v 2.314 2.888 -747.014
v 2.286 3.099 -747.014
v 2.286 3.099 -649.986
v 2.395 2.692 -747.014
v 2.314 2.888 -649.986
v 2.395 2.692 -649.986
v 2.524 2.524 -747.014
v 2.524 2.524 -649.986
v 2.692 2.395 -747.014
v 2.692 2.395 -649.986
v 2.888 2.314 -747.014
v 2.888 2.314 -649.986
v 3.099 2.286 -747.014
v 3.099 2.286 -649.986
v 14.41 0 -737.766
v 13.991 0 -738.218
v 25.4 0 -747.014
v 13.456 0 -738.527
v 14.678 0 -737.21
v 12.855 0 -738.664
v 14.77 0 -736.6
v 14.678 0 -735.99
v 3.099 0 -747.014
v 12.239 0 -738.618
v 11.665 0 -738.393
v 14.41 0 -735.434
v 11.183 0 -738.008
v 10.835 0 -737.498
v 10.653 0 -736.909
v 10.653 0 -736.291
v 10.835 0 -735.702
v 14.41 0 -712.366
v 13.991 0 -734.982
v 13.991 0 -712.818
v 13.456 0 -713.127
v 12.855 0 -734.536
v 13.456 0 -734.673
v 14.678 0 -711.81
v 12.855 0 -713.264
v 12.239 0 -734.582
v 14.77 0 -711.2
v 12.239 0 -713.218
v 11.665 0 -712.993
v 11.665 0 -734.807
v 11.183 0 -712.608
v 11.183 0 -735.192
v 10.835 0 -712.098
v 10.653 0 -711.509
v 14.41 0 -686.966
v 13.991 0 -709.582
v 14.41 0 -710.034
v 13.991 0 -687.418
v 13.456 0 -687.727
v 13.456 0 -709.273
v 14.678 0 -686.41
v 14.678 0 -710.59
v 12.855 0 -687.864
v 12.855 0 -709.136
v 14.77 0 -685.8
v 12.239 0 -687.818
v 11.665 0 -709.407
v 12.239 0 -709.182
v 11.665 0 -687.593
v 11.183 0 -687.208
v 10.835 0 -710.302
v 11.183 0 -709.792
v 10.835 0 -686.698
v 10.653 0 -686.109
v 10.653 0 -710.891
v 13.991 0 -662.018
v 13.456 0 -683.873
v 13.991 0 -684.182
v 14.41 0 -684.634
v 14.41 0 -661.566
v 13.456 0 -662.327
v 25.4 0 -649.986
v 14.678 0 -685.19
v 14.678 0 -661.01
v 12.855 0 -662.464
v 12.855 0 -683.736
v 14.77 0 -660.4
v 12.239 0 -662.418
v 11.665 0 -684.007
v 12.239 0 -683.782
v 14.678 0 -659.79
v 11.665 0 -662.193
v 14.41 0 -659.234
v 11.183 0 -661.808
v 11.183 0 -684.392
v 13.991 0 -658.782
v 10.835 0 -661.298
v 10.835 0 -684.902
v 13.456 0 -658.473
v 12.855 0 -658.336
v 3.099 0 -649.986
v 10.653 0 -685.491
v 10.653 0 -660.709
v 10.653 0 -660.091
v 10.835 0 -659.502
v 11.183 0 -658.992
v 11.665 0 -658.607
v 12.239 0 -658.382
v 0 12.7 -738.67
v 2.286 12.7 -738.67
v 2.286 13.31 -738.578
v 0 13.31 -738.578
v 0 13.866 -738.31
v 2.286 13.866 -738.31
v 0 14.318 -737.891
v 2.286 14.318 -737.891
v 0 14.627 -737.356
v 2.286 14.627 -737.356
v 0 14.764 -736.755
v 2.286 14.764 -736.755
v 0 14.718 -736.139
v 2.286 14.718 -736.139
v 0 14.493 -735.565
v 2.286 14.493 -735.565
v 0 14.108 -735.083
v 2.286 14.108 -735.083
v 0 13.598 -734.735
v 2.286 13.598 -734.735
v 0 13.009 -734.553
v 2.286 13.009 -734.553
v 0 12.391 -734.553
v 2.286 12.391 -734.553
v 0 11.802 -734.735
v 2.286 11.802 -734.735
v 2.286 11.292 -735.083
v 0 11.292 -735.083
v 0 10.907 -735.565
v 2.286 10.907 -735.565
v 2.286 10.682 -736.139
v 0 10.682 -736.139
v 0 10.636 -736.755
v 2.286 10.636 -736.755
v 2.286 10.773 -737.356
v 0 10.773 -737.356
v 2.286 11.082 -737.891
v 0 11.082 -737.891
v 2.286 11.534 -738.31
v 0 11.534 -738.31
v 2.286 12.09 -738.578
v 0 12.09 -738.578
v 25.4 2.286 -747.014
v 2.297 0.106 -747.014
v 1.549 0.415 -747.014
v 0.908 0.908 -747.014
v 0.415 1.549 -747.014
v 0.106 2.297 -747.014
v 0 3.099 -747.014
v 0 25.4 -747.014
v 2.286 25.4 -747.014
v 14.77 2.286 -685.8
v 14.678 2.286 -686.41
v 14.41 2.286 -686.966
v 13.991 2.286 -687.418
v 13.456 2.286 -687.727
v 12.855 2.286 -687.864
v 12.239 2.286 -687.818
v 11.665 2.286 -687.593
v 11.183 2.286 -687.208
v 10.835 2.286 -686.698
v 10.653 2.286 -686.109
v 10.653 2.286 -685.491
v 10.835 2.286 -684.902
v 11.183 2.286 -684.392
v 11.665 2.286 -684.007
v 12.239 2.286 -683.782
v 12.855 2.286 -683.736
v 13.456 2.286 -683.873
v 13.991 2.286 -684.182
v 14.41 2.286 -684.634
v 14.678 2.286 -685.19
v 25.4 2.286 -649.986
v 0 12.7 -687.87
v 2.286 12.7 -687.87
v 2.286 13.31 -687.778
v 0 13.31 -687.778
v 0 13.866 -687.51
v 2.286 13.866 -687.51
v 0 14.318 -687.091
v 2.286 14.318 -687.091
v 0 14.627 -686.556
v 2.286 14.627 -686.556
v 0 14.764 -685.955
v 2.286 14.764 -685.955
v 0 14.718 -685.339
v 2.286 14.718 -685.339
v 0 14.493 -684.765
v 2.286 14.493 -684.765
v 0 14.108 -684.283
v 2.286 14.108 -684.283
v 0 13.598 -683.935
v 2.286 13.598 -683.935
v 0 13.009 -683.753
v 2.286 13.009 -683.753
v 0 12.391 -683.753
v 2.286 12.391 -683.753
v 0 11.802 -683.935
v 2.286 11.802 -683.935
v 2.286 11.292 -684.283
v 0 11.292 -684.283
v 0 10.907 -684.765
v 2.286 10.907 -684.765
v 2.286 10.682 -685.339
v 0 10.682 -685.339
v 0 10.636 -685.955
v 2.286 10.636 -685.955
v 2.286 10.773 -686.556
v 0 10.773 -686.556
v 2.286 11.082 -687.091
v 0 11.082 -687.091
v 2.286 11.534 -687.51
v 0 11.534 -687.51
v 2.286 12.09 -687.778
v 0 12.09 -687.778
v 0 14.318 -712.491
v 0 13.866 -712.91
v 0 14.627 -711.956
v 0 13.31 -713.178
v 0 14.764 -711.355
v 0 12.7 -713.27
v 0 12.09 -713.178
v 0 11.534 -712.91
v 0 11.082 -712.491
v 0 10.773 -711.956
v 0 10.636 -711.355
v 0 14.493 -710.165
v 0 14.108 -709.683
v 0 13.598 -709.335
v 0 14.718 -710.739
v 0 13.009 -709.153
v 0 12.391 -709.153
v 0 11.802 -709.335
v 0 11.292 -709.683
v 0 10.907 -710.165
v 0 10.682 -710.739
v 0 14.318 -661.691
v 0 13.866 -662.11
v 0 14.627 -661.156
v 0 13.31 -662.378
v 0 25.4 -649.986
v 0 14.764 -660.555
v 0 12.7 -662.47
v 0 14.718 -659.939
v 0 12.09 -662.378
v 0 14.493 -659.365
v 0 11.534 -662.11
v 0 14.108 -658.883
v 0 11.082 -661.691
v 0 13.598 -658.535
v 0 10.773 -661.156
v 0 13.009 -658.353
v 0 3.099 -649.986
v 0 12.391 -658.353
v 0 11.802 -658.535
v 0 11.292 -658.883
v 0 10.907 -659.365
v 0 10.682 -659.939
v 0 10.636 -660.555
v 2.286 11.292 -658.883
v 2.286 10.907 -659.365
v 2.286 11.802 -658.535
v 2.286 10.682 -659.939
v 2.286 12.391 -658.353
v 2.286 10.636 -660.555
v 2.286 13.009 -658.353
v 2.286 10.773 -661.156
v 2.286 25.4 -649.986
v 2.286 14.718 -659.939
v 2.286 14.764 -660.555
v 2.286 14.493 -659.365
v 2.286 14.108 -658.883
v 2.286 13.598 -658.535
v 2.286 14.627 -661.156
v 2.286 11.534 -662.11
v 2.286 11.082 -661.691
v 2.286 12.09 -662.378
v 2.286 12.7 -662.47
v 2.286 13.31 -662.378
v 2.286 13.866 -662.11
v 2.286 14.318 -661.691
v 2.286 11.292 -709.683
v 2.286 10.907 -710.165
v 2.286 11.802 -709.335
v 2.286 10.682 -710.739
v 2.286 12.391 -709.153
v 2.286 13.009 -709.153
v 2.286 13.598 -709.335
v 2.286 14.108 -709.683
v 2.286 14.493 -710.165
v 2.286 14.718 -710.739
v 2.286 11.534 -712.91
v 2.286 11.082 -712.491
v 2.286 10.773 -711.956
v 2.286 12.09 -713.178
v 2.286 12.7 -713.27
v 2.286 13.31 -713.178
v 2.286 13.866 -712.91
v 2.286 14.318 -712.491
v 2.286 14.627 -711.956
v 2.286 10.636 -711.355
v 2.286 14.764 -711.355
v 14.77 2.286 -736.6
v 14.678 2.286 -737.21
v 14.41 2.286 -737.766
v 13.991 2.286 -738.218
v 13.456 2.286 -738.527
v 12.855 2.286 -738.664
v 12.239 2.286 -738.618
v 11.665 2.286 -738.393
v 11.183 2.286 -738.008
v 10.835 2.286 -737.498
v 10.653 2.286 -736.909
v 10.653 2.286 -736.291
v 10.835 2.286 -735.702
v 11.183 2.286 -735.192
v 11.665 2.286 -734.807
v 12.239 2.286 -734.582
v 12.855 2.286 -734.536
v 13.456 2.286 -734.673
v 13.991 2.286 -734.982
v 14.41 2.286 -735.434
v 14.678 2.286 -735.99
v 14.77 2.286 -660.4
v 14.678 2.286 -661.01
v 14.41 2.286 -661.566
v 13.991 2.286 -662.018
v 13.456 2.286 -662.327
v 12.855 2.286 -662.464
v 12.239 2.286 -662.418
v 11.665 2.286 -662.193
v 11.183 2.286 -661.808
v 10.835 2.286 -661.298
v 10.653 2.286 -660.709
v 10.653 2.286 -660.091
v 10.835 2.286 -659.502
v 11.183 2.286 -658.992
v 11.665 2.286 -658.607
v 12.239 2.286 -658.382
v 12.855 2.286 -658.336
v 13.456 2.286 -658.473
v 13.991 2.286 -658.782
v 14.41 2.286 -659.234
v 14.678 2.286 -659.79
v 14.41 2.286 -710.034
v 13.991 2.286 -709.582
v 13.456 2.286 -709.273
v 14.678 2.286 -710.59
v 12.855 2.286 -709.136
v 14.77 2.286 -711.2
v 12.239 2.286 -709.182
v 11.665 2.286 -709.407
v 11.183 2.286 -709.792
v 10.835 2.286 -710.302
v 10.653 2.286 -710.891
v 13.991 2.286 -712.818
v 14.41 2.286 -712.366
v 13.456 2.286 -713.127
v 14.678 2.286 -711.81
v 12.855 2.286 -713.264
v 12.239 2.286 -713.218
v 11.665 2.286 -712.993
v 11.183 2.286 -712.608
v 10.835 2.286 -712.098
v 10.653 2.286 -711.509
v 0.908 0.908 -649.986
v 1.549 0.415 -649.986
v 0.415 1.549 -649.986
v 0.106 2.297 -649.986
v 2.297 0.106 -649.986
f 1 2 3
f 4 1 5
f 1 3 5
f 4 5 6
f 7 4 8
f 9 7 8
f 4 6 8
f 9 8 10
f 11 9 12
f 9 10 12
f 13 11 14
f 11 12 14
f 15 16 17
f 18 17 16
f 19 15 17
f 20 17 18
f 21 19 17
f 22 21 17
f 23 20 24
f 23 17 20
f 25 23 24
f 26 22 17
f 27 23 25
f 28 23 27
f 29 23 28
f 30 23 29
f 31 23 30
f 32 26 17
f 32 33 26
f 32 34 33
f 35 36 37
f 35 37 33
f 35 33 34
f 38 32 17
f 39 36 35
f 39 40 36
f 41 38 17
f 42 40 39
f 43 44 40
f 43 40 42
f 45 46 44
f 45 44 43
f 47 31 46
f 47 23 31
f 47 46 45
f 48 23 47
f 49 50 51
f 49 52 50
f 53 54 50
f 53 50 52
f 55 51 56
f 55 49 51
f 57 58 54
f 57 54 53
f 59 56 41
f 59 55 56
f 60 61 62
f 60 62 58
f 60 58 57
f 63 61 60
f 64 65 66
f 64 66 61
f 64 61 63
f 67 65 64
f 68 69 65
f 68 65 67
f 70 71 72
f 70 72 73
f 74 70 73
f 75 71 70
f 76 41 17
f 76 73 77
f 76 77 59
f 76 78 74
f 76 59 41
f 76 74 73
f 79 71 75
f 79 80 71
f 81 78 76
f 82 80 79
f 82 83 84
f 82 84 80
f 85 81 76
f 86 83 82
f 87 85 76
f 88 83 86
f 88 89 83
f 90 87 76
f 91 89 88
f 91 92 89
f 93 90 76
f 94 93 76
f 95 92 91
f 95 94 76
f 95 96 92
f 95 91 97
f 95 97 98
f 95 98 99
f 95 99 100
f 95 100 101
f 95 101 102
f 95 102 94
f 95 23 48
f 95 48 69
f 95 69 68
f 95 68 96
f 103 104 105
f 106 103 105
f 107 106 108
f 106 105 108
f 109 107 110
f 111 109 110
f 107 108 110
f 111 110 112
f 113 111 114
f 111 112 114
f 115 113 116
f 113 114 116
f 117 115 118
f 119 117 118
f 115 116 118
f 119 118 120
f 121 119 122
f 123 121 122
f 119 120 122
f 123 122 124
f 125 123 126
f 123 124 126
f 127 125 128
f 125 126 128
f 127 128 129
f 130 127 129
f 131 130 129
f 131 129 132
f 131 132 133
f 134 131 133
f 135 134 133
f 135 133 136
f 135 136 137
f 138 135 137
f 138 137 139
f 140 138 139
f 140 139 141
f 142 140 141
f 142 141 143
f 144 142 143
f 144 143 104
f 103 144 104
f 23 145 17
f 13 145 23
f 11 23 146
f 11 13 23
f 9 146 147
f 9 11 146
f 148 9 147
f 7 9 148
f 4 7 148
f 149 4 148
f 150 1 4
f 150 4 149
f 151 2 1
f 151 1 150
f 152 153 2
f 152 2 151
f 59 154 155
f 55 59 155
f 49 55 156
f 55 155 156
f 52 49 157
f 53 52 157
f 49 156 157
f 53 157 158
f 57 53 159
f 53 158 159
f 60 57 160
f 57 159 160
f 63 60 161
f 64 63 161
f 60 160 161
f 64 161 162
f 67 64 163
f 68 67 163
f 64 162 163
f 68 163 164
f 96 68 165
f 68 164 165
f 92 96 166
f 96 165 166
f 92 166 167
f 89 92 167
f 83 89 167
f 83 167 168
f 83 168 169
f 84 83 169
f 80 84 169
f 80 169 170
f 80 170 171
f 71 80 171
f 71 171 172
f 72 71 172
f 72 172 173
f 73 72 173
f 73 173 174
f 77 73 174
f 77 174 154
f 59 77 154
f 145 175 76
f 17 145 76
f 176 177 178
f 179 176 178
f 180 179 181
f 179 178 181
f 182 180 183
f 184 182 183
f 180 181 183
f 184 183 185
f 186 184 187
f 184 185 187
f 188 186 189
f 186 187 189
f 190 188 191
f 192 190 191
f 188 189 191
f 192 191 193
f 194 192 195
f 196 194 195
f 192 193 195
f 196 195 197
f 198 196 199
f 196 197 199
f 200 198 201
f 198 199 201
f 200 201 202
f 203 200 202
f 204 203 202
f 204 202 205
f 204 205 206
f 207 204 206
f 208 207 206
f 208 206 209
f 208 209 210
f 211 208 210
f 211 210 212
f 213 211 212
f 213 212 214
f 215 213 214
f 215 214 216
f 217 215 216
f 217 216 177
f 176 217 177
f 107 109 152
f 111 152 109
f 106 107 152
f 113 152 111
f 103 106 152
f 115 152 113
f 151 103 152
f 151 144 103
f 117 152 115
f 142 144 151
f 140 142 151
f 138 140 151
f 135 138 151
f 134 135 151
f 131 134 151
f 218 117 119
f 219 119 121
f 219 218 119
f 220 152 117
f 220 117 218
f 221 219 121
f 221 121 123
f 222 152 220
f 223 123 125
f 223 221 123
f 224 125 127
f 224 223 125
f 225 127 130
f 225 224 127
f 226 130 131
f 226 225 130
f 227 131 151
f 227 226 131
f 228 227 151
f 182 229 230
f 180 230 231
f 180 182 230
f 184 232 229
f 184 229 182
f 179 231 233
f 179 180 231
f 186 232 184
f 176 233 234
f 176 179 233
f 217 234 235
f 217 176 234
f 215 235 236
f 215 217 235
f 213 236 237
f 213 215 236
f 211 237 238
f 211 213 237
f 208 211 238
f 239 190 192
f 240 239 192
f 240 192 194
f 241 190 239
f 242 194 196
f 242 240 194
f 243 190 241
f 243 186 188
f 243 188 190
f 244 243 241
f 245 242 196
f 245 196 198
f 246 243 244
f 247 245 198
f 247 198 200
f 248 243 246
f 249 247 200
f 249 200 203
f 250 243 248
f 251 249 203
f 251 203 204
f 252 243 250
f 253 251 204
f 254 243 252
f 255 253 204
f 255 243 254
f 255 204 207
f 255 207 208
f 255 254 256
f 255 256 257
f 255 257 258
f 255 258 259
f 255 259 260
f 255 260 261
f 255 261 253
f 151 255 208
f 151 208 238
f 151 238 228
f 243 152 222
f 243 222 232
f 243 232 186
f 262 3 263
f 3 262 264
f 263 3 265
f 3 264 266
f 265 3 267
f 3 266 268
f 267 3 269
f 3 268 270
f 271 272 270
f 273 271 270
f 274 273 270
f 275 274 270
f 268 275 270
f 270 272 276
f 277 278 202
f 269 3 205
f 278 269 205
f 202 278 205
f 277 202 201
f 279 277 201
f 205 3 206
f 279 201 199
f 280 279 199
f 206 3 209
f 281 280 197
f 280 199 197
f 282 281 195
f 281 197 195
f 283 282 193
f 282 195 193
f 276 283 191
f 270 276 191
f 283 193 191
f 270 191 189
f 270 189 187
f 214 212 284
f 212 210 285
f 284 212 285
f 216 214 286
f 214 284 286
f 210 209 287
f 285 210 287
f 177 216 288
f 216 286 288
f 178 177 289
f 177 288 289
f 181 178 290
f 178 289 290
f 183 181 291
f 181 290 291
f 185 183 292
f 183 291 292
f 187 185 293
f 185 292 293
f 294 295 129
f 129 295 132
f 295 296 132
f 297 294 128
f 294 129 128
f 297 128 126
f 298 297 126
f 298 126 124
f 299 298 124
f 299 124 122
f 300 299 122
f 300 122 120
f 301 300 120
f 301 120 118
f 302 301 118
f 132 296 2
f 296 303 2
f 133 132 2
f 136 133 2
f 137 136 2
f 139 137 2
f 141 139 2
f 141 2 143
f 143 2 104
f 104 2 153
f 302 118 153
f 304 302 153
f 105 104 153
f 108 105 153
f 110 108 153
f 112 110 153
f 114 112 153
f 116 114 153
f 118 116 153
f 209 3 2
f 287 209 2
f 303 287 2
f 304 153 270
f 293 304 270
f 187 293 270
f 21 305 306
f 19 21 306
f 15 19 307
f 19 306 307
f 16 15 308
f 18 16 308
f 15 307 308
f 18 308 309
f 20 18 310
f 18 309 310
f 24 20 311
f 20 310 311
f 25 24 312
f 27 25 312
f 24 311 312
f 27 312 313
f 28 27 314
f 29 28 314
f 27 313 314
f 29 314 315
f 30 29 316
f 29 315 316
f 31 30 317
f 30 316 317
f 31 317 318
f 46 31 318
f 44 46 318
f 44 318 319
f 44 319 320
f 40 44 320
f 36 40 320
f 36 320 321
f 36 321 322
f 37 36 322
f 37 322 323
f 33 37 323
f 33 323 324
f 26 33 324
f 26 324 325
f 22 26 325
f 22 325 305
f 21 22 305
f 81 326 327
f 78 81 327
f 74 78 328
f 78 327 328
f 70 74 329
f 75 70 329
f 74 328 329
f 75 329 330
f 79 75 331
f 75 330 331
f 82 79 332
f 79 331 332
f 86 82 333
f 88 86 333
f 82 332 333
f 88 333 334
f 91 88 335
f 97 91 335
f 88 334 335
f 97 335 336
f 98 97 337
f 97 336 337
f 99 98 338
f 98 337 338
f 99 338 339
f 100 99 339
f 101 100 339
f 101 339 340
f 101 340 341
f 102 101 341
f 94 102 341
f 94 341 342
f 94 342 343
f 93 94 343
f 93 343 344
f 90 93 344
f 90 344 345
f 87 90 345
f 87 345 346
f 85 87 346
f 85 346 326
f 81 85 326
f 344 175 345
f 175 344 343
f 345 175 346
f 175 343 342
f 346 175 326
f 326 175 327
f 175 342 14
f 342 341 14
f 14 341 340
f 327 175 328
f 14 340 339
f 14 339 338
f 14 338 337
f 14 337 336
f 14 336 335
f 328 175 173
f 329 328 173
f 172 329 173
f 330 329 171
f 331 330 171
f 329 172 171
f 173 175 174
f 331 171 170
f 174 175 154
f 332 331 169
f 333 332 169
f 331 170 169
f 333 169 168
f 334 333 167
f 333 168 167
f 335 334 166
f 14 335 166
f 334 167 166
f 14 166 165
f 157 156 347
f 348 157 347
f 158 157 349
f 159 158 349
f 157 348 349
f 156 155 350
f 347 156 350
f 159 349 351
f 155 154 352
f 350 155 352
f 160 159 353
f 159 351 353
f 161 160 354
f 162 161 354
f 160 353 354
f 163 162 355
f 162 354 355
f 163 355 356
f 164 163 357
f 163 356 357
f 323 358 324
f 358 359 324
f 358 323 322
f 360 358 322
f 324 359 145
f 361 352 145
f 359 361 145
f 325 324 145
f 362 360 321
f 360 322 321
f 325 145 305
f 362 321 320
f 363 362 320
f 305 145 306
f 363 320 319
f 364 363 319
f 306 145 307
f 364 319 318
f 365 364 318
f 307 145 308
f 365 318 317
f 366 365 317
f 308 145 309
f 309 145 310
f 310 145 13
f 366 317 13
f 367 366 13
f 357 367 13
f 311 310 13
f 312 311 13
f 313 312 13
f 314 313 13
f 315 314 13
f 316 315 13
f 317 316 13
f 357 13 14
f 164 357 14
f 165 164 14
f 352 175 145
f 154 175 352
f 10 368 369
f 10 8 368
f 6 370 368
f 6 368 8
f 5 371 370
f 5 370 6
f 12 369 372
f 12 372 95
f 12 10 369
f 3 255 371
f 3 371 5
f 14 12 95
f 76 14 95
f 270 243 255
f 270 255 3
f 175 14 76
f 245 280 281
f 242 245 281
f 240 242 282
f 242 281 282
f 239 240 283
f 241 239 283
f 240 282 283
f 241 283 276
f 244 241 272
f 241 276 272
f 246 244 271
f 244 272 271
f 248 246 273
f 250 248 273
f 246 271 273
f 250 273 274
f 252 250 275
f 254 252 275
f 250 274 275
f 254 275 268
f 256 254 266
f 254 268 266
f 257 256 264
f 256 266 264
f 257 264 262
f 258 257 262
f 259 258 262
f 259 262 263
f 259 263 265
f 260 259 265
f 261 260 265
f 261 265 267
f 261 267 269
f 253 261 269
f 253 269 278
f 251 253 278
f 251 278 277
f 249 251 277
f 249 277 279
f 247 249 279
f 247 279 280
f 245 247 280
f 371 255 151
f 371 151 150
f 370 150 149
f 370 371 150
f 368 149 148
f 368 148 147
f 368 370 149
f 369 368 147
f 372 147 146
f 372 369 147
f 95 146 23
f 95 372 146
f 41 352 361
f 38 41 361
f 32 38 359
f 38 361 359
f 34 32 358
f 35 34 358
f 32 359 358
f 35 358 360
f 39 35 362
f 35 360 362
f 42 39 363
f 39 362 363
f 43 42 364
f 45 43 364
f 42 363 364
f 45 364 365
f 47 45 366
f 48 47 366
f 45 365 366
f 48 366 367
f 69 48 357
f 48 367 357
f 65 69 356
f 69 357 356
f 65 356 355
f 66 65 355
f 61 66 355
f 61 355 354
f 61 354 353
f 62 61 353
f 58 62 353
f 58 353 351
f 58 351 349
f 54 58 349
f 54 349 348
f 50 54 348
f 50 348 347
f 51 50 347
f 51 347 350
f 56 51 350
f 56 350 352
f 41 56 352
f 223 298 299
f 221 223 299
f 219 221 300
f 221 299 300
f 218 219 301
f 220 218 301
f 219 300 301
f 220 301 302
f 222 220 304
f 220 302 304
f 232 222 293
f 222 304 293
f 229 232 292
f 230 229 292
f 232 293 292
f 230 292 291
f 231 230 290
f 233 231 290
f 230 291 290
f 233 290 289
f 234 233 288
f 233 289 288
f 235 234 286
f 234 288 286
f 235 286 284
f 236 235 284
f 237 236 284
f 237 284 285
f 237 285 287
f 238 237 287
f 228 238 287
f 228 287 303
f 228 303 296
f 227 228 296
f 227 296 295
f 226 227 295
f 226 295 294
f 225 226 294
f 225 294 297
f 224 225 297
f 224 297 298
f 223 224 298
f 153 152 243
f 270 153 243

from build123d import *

# Parameters (mm, degrees)
SKETCH1_W                  = 25.4
SKETCH1_H                  = 1498.6
BOSS_EXTRUDE1_DEPTH        = 25.4
SKETCH2_W                  = 23.114
SKETCH2_H                  = 23.114
CUT_EXTRUDE1_DEPTH         = 1499.6
M3_5_CLEARANCE_HOLE1_D     = 4.1402
M3_5_CLEARANCE_HOLE1_DEPTH = 25.4
M3_5_CLEARANCE_HOLE2_D     = 4.1402
M3_5_CLEARANCE_HOLE2_DEPTH = 25.4
CHAMFER1_SIZE              = 2.159
FILLET1_R                  = 0.8128
FILLET2_R                  = 3.0988
SKETCH8_W                  = 95.882963774
SKETCH8_H                  = 79.338329604
CUT_EXTRUDE3_DEPTH         = 1397
SKETCH9_W                  = 55.647897921
SKETCH9_H                  = 59.659370493
CUT_EXTRUDE4_DEPTH         = 2.286
SKETCH10_W                 = 60.180202688
SKETCH10_H                 = 53.53268885
CUT_EXTRUDE5_DEPTH         = 2.286


with BuildPart() as part:
    # Sketch1 → Boss-Extrude1 (new body)
    with BuildSketch(Plane(origin=(0, 0, 0), x_dir=(0, -1, 0), z_dir=(-1, 0, 0))):
        with Locations((-12.7, 0)):
            Rectangle(SKETCH1_W, SKETCH1_H)
    extrude(amount=-BOSS_EXTRUDE1_DEPTH)

    # Sketch2 → Cut-Extrude1 (cut, through all)
    with BuildSketch(Plane(origin=(0, 0, -749.3), x_dir=(-1, 0, 0), z_dir=(0, 0, -1))):
        with Locations((-13.843, 13.843)):
            Rectangle(SKETCH2_W, SKETCH2_H)
    extrude(amount=-CUT_EXTRUDE1_DEPTH, mode=Mode.SUBTRACT)

    # M3.5 Clearance Hole1
    with Locations(Plane(origin=(0, 0, 0), x_dir=(-1, 0, 0), z_dir=(0, -1, 0))):
        with Locations((-12.7, 736.6), (-12.7, 711.2), (-12.7, 685.8), (-12.7, 660.4), (-12.7, 635), (-12.7, 609.6), (-12.7, 584.2), (-12.7, 558.8), (-12.7, 533.4), (-12.7, 508), (-12.7, 482.6), (-12.7, 457.2), (-12.7, 431.8), (-12.7, 406.4), (-12.7, 381), (-12.7, 355.6), (-12.7, 330.2), (-12.7, 304.8), (-12.7, 279.4), (-12.7, 254), (-12.7, 228.6), (-12.7, 203.2), (-12.7, 177.8), (-12.7, 152.4), (-12.7, 127), (-12.7, 101.6), (-12.7, 76.2), (-12.7, 50.8), (-12.7, 25.4), (-12.7, 0), (-12.7, -25.4), (-12.7, -50.8), (-12.7, -76.2), (-12.7, -101.6), (-12.7, -127), (-12.7, -152.4), (-12.7, -177.8), (-12.7, -203.2), (-12.7, -228.6), (-12.7, -254), (-12.7, -279.4), (-12.7, -304.8), (-12.7, -330.2), (-12.7, -355.6), (-12.7, -381), (-12.7, -406.4), (-12.7, -431.8), (-12.7, -457.2), (-12.7, -482.6), (-12.7, -508), (-12.7, -533.4), (-12.7, -558.8), (-12.7, -584.2), (-12.7, -609.6), (-12.7, -635), (-12.7, -660.4), (-12.7, -685.8), (-12.7, -711.2), (-12.7, -736.6)):
            Hole(M3_5_CLEARANCE_HOLE1_D / 2, depth=M3_5_CLEARANCE_HOLE1_DEPTH)

    # M3.5 Clearance Hole2
    with Locations(Plane.ZY):
        with Locations((711.2, 12.7), (736.6, 12.7), (685.8, 12.7), (660.4, 12.7), (635, 12.7), (609.6, 12.7), (584.2, 12.7), (558.8, 12.7), (533.4, 12.7), (508, 12.7), (482.6, 12.7), (457.2, 12.7), (431.8, 12.7), (406.4, 12.7), (381, 12.7), (355.6, 12.7), (330.2, 12.7), (304.8, 12.7), (279.4, 12.7), (254, 12.7), (228.6, 12.7), (203.2, 12.7), (177.8, 12.7), (152.4, 12.7), (127, 12.7), (101.6, 12.7), (76.2, 12.7), (50.8, 12.7), (25.4, 12.7), (0, 12.7), (-25.4, 12.7), (-50.8, 12.7), (-76.2, 12.7), (-101.6, 12.7), (-127, 12.7), (-152.4, 12.7), (-177.8, 12.7), (-203.2, 12.7), (-228.6, 12.7), (-254, 12.7), (-279.4, 12.7), (-304.8, 12.7), (-330.2, 12.7), (-355.6, 12.7), (-381, 12.7), (-406.4, 12.7), (-431.8, 12.7), (-457.2, 12.7), (-482.6, 12.7), (-508, 12.7), (-533.4, 12.7), (-558.8, 12.7), (-584.2, 12.7), (-609.6, 12.7), (-635, 12.7), (-660.4, 12.7), (-685.8, 12.7), (-711.2, 12.7), (-736.6, 12.7)):
            Hole(M3_5_CLEARANCE_HOLE2_D / 2, depth=M3_5_CLEARANCE_HOLE2_DEPTH)

    # Chamfer1
    chamfer1_edges = [part.edges().sort_by_distance(p)[0] for p in [
        (25.4, 1.143, -749.3),
        (1.143, 25.4, 749.3),
        (1.143, 25.4, -749.3),
        (25.4, 1.143, 749.3),
    ]]
    chamfer(chamfer1_edges, length=CHAMFER1_SIZE)

    # Fillet1
    fillet1_edges = [part.edges().sort_by_distance(p)[0] for p in [
        (2.286, 2.286, 0),
    ]]
    fillet(fillet1_edges, radius=FILLET1_R)

    # Fillet2
    fillet2_edges = [part.edges().sort_by_distance(p)[0] for p in [
        (0, 0, 0),
    ]]
    fillet(fillet2_edges, radius=FILLET2_R)

    # Sketch8 → Cut-Extrude3 (cut)
    with BuildSketch(Plane.XY.offset(749.3)):
        with Locations((2.286, 3.0988)):
            Rectangle(SKETCH8_W, SKETCH8_H)
    extrude(amount=-CUT_EXTRUDE3_DEPTH, mode=Mode.SUBTRACT)

    # Sketch9 → Cut-Extrude4 (cut)
    with BuildSketch(Plane.XY.offset(-647.7)):
        with Locations((1.567971806, 1.525578147)):
            Rectangle(SKETCH9_W, SKETCH9_H)
    extrude(amount=-CUT_EXTRUDE4_DEPTH, mode=Mode.SUBTRACT)

    # Sketch10 → Cut-Extrude5 (cut)
    with BuildSketch(Plane(origin=(0, 0, -749.3), x_dir=(-1, 0, 0), z_dir=(0, 0, -1))):
        with Locations((-0.996649486, 3.303060092)):
            Rectangle(SKETCH10_W, SKETCH10_H)
    extrude(amount=-CUT_EXTRUDE5_DEPTH, mode=Mode.SUBTRACT)


solid = part.part
